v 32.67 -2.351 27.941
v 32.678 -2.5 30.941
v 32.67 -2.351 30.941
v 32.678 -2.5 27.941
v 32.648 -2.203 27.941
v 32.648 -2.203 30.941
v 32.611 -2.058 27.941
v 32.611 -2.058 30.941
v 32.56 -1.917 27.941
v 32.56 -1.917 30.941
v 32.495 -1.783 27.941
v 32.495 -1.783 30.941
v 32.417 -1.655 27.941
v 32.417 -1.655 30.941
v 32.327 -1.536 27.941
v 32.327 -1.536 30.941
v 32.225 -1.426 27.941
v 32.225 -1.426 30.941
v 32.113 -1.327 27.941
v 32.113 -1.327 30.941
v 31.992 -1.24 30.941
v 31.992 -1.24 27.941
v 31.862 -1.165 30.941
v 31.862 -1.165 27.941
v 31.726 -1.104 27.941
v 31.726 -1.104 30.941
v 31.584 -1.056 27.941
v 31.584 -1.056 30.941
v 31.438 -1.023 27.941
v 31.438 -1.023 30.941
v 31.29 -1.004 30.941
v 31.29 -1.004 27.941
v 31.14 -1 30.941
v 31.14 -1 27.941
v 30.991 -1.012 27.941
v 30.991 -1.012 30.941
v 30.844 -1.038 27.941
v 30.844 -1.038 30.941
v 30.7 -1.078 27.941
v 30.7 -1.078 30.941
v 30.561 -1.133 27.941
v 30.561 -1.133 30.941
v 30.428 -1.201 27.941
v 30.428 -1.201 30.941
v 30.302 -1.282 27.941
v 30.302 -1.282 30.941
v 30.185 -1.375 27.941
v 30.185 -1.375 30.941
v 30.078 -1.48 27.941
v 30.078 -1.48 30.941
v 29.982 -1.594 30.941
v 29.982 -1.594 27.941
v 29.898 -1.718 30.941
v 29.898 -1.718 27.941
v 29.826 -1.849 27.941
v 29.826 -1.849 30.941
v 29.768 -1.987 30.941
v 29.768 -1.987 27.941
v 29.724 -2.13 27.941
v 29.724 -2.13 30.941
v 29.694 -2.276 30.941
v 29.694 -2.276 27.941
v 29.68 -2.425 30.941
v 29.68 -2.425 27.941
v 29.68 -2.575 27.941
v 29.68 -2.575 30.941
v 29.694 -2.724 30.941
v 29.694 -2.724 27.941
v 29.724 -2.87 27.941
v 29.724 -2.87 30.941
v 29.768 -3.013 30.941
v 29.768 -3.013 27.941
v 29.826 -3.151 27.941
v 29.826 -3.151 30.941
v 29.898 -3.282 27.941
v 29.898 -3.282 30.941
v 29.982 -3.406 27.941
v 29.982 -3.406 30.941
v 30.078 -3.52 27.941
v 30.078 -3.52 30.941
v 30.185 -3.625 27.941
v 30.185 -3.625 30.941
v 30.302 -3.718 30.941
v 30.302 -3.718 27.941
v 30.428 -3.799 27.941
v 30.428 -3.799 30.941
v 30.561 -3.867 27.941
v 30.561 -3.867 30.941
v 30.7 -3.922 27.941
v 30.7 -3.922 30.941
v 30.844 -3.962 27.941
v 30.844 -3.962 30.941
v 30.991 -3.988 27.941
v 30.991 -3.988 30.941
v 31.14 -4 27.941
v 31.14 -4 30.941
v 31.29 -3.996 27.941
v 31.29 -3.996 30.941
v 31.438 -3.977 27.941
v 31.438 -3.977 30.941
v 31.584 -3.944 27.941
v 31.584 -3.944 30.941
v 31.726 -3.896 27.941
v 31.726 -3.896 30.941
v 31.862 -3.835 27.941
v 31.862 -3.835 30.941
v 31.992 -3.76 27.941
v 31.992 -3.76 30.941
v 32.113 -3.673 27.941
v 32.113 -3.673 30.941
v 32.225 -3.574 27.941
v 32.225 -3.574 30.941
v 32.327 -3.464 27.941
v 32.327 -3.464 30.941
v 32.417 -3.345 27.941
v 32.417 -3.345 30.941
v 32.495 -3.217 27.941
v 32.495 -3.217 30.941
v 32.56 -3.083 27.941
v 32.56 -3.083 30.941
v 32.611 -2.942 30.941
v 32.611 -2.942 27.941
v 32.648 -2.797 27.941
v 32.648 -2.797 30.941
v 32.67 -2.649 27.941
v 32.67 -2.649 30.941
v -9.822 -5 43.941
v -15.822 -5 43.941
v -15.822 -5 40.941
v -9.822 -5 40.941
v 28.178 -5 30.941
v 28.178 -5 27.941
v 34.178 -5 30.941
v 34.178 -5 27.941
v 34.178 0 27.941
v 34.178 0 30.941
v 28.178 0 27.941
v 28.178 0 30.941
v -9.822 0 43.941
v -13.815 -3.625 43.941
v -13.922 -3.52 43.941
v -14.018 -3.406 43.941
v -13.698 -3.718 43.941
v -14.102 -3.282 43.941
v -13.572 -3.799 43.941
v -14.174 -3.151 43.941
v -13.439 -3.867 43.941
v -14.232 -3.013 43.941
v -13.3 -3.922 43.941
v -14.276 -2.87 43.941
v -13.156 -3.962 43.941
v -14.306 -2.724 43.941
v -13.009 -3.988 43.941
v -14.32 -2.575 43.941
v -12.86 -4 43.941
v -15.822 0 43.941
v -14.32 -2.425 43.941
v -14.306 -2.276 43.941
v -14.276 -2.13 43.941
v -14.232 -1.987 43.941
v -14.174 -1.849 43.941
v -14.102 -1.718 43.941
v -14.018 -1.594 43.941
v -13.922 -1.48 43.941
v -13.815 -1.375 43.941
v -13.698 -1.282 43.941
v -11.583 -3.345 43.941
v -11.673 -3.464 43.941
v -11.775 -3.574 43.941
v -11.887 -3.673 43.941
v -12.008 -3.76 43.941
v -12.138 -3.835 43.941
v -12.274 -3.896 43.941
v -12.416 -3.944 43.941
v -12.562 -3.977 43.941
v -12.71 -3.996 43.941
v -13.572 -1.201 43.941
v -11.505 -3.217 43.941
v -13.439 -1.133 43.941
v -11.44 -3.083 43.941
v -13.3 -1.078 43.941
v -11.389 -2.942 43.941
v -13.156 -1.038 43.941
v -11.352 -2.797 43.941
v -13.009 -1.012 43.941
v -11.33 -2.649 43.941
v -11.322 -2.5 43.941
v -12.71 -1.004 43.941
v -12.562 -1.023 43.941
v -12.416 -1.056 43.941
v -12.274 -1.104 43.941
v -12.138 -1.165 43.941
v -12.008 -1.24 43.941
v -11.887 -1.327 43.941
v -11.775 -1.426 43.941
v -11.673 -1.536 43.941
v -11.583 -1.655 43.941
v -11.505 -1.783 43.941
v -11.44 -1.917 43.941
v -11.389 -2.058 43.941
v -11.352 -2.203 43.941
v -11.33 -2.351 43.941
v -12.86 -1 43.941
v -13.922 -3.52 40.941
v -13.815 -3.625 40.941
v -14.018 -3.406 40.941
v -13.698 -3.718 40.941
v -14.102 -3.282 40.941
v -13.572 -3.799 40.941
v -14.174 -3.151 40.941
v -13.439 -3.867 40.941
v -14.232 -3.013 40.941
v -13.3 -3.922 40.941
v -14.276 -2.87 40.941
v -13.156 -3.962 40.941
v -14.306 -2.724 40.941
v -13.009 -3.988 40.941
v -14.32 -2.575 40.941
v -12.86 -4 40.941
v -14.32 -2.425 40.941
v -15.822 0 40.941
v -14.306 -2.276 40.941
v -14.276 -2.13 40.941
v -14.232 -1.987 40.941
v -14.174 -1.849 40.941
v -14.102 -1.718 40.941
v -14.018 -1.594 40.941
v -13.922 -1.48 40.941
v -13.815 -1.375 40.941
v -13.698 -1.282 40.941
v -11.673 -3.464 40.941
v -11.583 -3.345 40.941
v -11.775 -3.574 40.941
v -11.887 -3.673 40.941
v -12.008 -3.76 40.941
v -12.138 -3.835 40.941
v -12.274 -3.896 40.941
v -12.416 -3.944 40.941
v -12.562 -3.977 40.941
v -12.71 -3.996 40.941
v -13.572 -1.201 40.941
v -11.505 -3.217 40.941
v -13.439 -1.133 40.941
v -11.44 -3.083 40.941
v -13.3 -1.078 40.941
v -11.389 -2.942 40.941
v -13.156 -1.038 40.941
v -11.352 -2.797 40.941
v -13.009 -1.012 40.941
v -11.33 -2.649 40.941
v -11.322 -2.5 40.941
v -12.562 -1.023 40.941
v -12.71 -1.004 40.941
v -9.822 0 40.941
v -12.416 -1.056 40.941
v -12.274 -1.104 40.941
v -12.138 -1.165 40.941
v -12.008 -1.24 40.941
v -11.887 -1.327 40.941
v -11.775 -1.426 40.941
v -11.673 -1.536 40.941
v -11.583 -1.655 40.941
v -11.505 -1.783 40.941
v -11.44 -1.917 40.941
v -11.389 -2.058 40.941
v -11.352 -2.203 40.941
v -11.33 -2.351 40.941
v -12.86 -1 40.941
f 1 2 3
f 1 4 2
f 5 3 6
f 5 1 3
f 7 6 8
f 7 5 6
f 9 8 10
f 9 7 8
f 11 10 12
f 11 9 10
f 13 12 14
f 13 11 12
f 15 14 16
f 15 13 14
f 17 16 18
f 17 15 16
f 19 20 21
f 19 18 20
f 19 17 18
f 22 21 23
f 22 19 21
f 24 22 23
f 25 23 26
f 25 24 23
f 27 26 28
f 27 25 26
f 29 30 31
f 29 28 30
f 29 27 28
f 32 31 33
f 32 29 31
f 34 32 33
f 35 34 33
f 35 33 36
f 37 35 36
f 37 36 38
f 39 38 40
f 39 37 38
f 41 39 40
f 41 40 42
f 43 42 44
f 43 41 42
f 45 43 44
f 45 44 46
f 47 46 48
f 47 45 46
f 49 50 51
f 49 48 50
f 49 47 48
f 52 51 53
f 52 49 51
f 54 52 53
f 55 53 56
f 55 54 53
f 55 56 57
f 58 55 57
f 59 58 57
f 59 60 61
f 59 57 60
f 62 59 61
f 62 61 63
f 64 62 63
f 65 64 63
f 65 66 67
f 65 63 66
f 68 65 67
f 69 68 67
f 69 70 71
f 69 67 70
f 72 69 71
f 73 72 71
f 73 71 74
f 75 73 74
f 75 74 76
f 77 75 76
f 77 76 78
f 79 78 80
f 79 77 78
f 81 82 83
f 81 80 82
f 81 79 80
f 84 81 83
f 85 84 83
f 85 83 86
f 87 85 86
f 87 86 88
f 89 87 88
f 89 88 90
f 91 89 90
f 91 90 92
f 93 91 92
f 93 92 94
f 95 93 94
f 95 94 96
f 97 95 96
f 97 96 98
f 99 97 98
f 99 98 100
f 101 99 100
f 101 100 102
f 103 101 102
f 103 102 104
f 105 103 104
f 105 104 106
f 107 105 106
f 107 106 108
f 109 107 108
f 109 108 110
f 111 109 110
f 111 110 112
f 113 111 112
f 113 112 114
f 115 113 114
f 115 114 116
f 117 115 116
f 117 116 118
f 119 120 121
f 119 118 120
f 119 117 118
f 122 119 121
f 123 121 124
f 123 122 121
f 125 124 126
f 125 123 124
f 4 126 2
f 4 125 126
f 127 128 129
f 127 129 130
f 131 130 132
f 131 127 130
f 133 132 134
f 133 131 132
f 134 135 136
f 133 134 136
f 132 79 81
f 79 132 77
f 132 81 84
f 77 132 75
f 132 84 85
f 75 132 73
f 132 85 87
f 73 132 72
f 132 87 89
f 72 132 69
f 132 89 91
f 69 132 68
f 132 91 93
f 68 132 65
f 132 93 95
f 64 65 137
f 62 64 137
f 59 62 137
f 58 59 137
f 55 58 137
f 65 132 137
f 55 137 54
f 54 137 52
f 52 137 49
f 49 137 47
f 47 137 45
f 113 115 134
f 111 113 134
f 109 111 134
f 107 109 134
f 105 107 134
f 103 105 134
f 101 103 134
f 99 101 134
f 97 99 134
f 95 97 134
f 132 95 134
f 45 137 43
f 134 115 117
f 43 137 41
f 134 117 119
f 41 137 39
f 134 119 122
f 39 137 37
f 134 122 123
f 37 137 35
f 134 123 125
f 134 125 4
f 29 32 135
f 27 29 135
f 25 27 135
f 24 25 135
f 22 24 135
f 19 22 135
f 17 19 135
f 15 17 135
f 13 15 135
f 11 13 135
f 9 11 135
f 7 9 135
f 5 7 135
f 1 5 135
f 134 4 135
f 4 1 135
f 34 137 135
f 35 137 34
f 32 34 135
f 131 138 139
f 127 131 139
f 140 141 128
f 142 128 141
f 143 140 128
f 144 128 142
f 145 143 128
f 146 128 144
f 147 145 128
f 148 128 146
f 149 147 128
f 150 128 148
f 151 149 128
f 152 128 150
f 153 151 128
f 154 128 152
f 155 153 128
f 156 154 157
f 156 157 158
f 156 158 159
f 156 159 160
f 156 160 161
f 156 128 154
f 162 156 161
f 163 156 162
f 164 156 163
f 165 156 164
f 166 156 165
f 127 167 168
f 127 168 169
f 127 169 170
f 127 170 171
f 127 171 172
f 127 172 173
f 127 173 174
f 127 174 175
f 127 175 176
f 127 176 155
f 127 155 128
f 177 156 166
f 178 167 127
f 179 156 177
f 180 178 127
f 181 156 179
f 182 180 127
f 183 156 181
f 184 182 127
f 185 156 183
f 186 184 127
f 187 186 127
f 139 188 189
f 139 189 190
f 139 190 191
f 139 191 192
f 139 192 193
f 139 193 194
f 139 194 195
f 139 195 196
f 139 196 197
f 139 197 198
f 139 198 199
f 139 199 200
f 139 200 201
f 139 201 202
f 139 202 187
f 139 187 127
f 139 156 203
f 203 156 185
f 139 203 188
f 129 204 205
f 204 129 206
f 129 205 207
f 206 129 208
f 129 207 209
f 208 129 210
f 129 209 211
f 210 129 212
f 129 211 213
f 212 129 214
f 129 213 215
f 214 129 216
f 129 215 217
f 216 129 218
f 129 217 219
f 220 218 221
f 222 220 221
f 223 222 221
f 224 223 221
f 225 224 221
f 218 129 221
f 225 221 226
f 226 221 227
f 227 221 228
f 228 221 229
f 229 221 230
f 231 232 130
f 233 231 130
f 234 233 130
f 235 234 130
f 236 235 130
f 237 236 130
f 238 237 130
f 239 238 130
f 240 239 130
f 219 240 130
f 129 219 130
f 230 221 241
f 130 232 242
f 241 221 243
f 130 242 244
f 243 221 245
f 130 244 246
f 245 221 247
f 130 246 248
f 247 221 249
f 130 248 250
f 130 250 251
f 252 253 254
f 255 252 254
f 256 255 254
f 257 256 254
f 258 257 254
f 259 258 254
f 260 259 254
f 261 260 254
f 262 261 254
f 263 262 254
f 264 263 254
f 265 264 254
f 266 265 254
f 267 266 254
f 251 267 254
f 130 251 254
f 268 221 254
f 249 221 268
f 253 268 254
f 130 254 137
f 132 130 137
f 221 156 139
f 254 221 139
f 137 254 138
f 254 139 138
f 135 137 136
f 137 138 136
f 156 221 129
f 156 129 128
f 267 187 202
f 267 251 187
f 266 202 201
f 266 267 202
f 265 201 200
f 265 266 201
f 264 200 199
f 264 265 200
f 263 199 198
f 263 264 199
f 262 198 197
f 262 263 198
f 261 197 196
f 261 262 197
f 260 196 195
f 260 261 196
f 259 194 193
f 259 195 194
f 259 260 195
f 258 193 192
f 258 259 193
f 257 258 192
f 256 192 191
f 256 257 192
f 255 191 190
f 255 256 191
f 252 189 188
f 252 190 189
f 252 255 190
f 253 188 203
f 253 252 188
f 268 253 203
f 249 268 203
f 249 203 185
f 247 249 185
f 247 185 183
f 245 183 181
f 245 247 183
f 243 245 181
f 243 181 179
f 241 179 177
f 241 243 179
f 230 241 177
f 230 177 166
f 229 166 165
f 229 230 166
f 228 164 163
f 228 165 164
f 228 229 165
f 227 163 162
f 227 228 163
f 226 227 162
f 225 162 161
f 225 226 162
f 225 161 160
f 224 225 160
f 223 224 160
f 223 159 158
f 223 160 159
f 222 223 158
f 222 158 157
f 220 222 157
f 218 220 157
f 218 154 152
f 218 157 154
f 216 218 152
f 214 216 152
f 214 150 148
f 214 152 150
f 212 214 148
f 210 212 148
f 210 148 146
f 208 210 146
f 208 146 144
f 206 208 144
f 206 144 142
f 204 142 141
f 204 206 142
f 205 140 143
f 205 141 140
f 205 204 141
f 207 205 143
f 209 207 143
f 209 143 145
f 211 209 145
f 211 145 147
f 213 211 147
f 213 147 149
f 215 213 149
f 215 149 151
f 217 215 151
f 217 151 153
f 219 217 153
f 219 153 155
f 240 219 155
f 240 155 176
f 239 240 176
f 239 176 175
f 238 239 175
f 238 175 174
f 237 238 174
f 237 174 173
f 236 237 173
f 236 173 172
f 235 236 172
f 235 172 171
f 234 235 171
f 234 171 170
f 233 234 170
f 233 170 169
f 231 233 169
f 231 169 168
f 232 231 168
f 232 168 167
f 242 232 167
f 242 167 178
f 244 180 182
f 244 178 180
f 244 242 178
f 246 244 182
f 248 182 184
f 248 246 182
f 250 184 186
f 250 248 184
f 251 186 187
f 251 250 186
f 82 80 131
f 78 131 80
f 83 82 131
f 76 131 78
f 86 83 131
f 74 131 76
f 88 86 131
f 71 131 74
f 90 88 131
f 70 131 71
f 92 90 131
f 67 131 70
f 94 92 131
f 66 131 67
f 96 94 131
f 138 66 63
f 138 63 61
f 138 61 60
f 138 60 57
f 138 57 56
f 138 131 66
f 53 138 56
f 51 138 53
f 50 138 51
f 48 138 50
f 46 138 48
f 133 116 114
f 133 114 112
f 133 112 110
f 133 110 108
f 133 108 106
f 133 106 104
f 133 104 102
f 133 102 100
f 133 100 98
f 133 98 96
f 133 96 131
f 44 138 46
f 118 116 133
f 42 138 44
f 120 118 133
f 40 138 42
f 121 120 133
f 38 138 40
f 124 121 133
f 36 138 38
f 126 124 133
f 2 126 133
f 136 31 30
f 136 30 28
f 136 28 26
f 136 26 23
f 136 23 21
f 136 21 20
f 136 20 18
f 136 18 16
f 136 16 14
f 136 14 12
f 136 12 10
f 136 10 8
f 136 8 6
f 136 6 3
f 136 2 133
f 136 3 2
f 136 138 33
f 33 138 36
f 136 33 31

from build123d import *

# Parameters (mm, degrees)
F0_W     = 6
F0_H     = 3
F1_DEPTH = 5
F2_R     = 1.5
F3_DEPTH = 100
F4_DEPTH = 100


with BuildPart() as f1:
    # F0 (on Front) → F1 (new body)
    with BuildSketch(Plane.XZ):
        with Locations((-12.822277, 42.440869)):
            Rectangle(F0_W, F0_H)
        Polygon((28.177723, 30.940869), (-9.822277, 43.940869), (-9.822277, 40.940869), (28.177723, 27.940869), align=None)
        with Locations((31.177723, 29.440869)):
            Rectangle(F0_W, F0_H)
    extrude(amount=F1_DEPTH)

    # F2 (on Top) → F3 (cut)
    with BuildSketch(Plane.XY):
        with Locations((-12.822277, -2.5)):
            Circle(F2_R)
    extrude(amount=F3_DEPTH, mode=Mode.SUBTRACT)

    # F2 (on Top) → F4 (cut)
    with BuildSketch(Plane.XY):
        with Locations((-12.822277, -2.5)):
            Circle(F2_R)
        with Locations((31.177723, -2.5)):
            Circle(F2_R)
    extrude(amount=F4_DEPTH, mode=Mode.SUBTRACT)


solid = f1.part
